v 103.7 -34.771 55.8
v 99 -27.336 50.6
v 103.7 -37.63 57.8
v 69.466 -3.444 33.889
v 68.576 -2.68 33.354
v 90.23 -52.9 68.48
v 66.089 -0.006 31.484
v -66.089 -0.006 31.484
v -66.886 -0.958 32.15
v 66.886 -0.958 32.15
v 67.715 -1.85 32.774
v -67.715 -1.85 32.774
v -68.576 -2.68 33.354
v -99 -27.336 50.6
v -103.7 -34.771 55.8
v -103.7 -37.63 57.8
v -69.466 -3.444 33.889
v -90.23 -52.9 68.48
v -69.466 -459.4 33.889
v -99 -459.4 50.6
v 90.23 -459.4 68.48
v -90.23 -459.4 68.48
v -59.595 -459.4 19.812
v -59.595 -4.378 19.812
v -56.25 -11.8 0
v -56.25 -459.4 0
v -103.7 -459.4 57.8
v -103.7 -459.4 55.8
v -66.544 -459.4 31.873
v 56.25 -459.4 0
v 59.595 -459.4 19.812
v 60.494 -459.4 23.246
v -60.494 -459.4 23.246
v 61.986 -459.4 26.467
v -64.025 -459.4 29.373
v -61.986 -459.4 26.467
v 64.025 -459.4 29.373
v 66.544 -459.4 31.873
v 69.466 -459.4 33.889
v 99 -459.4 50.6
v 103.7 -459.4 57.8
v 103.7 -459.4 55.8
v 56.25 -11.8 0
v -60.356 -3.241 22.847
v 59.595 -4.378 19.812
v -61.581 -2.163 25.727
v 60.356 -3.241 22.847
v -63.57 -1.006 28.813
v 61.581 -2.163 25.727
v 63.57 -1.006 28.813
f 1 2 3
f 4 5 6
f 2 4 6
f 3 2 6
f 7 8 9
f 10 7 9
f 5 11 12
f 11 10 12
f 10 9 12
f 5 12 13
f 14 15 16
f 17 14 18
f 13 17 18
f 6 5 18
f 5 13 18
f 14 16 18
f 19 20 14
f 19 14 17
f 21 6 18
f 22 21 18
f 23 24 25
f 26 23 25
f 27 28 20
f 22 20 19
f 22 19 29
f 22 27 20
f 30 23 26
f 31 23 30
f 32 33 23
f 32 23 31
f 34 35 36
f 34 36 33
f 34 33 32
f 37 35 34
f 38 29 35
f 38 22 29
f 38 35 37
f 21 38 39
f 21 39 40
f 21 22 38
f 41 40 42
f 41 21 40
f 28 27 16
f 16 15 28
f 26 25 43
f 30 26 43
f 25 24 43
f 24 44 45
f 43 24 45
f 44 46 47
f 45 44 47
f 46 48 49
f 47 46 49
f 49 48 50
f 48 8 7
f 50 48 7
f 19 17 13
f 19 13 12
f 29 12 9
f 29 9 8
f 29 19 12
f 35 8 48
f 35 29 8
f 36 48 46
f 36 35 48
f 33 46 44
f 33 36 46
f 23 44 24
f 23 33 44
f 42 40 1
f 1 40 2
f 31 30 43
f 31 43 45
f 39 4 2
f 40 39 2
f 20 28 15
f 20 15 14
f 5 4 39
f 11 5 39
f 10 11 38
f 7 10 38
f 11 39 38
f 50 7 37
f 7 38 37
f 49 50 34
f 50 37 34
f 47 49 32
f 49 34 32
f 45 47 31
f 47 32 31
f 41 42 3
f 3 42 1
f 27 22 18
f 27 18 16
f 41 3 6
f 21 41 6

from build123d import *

# Parameters (mm, degrees)
F1_DEPTH    = 459.4
F2_SIZE2    = 31.5
F2_SIZE     = 11.8
F3_T1_DEPTH = 453.6970794399
F4_R        = 20


# Not quite as in the source:
# - a fillet or chamfer that OpenCascade refuses, or shapes differently, is made with other operations: its cross-section is extruded or revolved along the edge and cut away or added


with BuildPart() as f1:
    # F0 (on Front) → F1 (new body)
    with BuildSketch(Plane.XZ):
        Polygon((-61.18, 29.2), (-56.25, 0), (56.25, 0), (61.18, 29.2), (99, 50.6), (103.7, 55.8), (103.7, 57.8), (90.23, 68.48), (-90.23, 68.48), (-103.7, 57.8), (-103.7, 55.8), (-99, 50.6), align=None)
    extrude(amount=F1_DEPTH)

    # F2
    f2_edges = [f1.edges().sort_by_distance(p)[0] for p in [
        (0, 0, 0),
    ]]
    f2_side = f1.faces().sort_by_distance((0, -229.7, 0))[0]
    chamfer(f2_edges, length=F2_SIZE, length2=F2_SIZE2, reference=f2_side)

    # F3: chamfer of 52.9 x 37 on 1 edges, made by hand

    # F3_s2 → F3_t1 (cut)
    with BuildSketch(Plane.YZ.offset(-226.8485397199)):
        Polygon((0, 31.48), (-52.9, 68.48), (0, 68.48), align=None)
    extrude(amount=F3_T1_DEPTH, mode=Mode.SUBTRACT)

    # F4 (call 1 of 2: OpenCascade refuses the feature's edges together)
    f4_edges = [f1.edges().sort_by_distance(p)[0] for p in [
        (61.18, -230.130794, 29.2),
    ]]
    fillet(f4_edges, radius=F4_R)

    # F4#2 (call 2 of 2)
    f4_2_edges = [f1.edges().sort_by_distance(p)[0] for p in [
        (-61.18, -230.130794, 29.2),
    ]]
    fillet(f4_2_edges, radius=F4_R)


solid = f1.part
